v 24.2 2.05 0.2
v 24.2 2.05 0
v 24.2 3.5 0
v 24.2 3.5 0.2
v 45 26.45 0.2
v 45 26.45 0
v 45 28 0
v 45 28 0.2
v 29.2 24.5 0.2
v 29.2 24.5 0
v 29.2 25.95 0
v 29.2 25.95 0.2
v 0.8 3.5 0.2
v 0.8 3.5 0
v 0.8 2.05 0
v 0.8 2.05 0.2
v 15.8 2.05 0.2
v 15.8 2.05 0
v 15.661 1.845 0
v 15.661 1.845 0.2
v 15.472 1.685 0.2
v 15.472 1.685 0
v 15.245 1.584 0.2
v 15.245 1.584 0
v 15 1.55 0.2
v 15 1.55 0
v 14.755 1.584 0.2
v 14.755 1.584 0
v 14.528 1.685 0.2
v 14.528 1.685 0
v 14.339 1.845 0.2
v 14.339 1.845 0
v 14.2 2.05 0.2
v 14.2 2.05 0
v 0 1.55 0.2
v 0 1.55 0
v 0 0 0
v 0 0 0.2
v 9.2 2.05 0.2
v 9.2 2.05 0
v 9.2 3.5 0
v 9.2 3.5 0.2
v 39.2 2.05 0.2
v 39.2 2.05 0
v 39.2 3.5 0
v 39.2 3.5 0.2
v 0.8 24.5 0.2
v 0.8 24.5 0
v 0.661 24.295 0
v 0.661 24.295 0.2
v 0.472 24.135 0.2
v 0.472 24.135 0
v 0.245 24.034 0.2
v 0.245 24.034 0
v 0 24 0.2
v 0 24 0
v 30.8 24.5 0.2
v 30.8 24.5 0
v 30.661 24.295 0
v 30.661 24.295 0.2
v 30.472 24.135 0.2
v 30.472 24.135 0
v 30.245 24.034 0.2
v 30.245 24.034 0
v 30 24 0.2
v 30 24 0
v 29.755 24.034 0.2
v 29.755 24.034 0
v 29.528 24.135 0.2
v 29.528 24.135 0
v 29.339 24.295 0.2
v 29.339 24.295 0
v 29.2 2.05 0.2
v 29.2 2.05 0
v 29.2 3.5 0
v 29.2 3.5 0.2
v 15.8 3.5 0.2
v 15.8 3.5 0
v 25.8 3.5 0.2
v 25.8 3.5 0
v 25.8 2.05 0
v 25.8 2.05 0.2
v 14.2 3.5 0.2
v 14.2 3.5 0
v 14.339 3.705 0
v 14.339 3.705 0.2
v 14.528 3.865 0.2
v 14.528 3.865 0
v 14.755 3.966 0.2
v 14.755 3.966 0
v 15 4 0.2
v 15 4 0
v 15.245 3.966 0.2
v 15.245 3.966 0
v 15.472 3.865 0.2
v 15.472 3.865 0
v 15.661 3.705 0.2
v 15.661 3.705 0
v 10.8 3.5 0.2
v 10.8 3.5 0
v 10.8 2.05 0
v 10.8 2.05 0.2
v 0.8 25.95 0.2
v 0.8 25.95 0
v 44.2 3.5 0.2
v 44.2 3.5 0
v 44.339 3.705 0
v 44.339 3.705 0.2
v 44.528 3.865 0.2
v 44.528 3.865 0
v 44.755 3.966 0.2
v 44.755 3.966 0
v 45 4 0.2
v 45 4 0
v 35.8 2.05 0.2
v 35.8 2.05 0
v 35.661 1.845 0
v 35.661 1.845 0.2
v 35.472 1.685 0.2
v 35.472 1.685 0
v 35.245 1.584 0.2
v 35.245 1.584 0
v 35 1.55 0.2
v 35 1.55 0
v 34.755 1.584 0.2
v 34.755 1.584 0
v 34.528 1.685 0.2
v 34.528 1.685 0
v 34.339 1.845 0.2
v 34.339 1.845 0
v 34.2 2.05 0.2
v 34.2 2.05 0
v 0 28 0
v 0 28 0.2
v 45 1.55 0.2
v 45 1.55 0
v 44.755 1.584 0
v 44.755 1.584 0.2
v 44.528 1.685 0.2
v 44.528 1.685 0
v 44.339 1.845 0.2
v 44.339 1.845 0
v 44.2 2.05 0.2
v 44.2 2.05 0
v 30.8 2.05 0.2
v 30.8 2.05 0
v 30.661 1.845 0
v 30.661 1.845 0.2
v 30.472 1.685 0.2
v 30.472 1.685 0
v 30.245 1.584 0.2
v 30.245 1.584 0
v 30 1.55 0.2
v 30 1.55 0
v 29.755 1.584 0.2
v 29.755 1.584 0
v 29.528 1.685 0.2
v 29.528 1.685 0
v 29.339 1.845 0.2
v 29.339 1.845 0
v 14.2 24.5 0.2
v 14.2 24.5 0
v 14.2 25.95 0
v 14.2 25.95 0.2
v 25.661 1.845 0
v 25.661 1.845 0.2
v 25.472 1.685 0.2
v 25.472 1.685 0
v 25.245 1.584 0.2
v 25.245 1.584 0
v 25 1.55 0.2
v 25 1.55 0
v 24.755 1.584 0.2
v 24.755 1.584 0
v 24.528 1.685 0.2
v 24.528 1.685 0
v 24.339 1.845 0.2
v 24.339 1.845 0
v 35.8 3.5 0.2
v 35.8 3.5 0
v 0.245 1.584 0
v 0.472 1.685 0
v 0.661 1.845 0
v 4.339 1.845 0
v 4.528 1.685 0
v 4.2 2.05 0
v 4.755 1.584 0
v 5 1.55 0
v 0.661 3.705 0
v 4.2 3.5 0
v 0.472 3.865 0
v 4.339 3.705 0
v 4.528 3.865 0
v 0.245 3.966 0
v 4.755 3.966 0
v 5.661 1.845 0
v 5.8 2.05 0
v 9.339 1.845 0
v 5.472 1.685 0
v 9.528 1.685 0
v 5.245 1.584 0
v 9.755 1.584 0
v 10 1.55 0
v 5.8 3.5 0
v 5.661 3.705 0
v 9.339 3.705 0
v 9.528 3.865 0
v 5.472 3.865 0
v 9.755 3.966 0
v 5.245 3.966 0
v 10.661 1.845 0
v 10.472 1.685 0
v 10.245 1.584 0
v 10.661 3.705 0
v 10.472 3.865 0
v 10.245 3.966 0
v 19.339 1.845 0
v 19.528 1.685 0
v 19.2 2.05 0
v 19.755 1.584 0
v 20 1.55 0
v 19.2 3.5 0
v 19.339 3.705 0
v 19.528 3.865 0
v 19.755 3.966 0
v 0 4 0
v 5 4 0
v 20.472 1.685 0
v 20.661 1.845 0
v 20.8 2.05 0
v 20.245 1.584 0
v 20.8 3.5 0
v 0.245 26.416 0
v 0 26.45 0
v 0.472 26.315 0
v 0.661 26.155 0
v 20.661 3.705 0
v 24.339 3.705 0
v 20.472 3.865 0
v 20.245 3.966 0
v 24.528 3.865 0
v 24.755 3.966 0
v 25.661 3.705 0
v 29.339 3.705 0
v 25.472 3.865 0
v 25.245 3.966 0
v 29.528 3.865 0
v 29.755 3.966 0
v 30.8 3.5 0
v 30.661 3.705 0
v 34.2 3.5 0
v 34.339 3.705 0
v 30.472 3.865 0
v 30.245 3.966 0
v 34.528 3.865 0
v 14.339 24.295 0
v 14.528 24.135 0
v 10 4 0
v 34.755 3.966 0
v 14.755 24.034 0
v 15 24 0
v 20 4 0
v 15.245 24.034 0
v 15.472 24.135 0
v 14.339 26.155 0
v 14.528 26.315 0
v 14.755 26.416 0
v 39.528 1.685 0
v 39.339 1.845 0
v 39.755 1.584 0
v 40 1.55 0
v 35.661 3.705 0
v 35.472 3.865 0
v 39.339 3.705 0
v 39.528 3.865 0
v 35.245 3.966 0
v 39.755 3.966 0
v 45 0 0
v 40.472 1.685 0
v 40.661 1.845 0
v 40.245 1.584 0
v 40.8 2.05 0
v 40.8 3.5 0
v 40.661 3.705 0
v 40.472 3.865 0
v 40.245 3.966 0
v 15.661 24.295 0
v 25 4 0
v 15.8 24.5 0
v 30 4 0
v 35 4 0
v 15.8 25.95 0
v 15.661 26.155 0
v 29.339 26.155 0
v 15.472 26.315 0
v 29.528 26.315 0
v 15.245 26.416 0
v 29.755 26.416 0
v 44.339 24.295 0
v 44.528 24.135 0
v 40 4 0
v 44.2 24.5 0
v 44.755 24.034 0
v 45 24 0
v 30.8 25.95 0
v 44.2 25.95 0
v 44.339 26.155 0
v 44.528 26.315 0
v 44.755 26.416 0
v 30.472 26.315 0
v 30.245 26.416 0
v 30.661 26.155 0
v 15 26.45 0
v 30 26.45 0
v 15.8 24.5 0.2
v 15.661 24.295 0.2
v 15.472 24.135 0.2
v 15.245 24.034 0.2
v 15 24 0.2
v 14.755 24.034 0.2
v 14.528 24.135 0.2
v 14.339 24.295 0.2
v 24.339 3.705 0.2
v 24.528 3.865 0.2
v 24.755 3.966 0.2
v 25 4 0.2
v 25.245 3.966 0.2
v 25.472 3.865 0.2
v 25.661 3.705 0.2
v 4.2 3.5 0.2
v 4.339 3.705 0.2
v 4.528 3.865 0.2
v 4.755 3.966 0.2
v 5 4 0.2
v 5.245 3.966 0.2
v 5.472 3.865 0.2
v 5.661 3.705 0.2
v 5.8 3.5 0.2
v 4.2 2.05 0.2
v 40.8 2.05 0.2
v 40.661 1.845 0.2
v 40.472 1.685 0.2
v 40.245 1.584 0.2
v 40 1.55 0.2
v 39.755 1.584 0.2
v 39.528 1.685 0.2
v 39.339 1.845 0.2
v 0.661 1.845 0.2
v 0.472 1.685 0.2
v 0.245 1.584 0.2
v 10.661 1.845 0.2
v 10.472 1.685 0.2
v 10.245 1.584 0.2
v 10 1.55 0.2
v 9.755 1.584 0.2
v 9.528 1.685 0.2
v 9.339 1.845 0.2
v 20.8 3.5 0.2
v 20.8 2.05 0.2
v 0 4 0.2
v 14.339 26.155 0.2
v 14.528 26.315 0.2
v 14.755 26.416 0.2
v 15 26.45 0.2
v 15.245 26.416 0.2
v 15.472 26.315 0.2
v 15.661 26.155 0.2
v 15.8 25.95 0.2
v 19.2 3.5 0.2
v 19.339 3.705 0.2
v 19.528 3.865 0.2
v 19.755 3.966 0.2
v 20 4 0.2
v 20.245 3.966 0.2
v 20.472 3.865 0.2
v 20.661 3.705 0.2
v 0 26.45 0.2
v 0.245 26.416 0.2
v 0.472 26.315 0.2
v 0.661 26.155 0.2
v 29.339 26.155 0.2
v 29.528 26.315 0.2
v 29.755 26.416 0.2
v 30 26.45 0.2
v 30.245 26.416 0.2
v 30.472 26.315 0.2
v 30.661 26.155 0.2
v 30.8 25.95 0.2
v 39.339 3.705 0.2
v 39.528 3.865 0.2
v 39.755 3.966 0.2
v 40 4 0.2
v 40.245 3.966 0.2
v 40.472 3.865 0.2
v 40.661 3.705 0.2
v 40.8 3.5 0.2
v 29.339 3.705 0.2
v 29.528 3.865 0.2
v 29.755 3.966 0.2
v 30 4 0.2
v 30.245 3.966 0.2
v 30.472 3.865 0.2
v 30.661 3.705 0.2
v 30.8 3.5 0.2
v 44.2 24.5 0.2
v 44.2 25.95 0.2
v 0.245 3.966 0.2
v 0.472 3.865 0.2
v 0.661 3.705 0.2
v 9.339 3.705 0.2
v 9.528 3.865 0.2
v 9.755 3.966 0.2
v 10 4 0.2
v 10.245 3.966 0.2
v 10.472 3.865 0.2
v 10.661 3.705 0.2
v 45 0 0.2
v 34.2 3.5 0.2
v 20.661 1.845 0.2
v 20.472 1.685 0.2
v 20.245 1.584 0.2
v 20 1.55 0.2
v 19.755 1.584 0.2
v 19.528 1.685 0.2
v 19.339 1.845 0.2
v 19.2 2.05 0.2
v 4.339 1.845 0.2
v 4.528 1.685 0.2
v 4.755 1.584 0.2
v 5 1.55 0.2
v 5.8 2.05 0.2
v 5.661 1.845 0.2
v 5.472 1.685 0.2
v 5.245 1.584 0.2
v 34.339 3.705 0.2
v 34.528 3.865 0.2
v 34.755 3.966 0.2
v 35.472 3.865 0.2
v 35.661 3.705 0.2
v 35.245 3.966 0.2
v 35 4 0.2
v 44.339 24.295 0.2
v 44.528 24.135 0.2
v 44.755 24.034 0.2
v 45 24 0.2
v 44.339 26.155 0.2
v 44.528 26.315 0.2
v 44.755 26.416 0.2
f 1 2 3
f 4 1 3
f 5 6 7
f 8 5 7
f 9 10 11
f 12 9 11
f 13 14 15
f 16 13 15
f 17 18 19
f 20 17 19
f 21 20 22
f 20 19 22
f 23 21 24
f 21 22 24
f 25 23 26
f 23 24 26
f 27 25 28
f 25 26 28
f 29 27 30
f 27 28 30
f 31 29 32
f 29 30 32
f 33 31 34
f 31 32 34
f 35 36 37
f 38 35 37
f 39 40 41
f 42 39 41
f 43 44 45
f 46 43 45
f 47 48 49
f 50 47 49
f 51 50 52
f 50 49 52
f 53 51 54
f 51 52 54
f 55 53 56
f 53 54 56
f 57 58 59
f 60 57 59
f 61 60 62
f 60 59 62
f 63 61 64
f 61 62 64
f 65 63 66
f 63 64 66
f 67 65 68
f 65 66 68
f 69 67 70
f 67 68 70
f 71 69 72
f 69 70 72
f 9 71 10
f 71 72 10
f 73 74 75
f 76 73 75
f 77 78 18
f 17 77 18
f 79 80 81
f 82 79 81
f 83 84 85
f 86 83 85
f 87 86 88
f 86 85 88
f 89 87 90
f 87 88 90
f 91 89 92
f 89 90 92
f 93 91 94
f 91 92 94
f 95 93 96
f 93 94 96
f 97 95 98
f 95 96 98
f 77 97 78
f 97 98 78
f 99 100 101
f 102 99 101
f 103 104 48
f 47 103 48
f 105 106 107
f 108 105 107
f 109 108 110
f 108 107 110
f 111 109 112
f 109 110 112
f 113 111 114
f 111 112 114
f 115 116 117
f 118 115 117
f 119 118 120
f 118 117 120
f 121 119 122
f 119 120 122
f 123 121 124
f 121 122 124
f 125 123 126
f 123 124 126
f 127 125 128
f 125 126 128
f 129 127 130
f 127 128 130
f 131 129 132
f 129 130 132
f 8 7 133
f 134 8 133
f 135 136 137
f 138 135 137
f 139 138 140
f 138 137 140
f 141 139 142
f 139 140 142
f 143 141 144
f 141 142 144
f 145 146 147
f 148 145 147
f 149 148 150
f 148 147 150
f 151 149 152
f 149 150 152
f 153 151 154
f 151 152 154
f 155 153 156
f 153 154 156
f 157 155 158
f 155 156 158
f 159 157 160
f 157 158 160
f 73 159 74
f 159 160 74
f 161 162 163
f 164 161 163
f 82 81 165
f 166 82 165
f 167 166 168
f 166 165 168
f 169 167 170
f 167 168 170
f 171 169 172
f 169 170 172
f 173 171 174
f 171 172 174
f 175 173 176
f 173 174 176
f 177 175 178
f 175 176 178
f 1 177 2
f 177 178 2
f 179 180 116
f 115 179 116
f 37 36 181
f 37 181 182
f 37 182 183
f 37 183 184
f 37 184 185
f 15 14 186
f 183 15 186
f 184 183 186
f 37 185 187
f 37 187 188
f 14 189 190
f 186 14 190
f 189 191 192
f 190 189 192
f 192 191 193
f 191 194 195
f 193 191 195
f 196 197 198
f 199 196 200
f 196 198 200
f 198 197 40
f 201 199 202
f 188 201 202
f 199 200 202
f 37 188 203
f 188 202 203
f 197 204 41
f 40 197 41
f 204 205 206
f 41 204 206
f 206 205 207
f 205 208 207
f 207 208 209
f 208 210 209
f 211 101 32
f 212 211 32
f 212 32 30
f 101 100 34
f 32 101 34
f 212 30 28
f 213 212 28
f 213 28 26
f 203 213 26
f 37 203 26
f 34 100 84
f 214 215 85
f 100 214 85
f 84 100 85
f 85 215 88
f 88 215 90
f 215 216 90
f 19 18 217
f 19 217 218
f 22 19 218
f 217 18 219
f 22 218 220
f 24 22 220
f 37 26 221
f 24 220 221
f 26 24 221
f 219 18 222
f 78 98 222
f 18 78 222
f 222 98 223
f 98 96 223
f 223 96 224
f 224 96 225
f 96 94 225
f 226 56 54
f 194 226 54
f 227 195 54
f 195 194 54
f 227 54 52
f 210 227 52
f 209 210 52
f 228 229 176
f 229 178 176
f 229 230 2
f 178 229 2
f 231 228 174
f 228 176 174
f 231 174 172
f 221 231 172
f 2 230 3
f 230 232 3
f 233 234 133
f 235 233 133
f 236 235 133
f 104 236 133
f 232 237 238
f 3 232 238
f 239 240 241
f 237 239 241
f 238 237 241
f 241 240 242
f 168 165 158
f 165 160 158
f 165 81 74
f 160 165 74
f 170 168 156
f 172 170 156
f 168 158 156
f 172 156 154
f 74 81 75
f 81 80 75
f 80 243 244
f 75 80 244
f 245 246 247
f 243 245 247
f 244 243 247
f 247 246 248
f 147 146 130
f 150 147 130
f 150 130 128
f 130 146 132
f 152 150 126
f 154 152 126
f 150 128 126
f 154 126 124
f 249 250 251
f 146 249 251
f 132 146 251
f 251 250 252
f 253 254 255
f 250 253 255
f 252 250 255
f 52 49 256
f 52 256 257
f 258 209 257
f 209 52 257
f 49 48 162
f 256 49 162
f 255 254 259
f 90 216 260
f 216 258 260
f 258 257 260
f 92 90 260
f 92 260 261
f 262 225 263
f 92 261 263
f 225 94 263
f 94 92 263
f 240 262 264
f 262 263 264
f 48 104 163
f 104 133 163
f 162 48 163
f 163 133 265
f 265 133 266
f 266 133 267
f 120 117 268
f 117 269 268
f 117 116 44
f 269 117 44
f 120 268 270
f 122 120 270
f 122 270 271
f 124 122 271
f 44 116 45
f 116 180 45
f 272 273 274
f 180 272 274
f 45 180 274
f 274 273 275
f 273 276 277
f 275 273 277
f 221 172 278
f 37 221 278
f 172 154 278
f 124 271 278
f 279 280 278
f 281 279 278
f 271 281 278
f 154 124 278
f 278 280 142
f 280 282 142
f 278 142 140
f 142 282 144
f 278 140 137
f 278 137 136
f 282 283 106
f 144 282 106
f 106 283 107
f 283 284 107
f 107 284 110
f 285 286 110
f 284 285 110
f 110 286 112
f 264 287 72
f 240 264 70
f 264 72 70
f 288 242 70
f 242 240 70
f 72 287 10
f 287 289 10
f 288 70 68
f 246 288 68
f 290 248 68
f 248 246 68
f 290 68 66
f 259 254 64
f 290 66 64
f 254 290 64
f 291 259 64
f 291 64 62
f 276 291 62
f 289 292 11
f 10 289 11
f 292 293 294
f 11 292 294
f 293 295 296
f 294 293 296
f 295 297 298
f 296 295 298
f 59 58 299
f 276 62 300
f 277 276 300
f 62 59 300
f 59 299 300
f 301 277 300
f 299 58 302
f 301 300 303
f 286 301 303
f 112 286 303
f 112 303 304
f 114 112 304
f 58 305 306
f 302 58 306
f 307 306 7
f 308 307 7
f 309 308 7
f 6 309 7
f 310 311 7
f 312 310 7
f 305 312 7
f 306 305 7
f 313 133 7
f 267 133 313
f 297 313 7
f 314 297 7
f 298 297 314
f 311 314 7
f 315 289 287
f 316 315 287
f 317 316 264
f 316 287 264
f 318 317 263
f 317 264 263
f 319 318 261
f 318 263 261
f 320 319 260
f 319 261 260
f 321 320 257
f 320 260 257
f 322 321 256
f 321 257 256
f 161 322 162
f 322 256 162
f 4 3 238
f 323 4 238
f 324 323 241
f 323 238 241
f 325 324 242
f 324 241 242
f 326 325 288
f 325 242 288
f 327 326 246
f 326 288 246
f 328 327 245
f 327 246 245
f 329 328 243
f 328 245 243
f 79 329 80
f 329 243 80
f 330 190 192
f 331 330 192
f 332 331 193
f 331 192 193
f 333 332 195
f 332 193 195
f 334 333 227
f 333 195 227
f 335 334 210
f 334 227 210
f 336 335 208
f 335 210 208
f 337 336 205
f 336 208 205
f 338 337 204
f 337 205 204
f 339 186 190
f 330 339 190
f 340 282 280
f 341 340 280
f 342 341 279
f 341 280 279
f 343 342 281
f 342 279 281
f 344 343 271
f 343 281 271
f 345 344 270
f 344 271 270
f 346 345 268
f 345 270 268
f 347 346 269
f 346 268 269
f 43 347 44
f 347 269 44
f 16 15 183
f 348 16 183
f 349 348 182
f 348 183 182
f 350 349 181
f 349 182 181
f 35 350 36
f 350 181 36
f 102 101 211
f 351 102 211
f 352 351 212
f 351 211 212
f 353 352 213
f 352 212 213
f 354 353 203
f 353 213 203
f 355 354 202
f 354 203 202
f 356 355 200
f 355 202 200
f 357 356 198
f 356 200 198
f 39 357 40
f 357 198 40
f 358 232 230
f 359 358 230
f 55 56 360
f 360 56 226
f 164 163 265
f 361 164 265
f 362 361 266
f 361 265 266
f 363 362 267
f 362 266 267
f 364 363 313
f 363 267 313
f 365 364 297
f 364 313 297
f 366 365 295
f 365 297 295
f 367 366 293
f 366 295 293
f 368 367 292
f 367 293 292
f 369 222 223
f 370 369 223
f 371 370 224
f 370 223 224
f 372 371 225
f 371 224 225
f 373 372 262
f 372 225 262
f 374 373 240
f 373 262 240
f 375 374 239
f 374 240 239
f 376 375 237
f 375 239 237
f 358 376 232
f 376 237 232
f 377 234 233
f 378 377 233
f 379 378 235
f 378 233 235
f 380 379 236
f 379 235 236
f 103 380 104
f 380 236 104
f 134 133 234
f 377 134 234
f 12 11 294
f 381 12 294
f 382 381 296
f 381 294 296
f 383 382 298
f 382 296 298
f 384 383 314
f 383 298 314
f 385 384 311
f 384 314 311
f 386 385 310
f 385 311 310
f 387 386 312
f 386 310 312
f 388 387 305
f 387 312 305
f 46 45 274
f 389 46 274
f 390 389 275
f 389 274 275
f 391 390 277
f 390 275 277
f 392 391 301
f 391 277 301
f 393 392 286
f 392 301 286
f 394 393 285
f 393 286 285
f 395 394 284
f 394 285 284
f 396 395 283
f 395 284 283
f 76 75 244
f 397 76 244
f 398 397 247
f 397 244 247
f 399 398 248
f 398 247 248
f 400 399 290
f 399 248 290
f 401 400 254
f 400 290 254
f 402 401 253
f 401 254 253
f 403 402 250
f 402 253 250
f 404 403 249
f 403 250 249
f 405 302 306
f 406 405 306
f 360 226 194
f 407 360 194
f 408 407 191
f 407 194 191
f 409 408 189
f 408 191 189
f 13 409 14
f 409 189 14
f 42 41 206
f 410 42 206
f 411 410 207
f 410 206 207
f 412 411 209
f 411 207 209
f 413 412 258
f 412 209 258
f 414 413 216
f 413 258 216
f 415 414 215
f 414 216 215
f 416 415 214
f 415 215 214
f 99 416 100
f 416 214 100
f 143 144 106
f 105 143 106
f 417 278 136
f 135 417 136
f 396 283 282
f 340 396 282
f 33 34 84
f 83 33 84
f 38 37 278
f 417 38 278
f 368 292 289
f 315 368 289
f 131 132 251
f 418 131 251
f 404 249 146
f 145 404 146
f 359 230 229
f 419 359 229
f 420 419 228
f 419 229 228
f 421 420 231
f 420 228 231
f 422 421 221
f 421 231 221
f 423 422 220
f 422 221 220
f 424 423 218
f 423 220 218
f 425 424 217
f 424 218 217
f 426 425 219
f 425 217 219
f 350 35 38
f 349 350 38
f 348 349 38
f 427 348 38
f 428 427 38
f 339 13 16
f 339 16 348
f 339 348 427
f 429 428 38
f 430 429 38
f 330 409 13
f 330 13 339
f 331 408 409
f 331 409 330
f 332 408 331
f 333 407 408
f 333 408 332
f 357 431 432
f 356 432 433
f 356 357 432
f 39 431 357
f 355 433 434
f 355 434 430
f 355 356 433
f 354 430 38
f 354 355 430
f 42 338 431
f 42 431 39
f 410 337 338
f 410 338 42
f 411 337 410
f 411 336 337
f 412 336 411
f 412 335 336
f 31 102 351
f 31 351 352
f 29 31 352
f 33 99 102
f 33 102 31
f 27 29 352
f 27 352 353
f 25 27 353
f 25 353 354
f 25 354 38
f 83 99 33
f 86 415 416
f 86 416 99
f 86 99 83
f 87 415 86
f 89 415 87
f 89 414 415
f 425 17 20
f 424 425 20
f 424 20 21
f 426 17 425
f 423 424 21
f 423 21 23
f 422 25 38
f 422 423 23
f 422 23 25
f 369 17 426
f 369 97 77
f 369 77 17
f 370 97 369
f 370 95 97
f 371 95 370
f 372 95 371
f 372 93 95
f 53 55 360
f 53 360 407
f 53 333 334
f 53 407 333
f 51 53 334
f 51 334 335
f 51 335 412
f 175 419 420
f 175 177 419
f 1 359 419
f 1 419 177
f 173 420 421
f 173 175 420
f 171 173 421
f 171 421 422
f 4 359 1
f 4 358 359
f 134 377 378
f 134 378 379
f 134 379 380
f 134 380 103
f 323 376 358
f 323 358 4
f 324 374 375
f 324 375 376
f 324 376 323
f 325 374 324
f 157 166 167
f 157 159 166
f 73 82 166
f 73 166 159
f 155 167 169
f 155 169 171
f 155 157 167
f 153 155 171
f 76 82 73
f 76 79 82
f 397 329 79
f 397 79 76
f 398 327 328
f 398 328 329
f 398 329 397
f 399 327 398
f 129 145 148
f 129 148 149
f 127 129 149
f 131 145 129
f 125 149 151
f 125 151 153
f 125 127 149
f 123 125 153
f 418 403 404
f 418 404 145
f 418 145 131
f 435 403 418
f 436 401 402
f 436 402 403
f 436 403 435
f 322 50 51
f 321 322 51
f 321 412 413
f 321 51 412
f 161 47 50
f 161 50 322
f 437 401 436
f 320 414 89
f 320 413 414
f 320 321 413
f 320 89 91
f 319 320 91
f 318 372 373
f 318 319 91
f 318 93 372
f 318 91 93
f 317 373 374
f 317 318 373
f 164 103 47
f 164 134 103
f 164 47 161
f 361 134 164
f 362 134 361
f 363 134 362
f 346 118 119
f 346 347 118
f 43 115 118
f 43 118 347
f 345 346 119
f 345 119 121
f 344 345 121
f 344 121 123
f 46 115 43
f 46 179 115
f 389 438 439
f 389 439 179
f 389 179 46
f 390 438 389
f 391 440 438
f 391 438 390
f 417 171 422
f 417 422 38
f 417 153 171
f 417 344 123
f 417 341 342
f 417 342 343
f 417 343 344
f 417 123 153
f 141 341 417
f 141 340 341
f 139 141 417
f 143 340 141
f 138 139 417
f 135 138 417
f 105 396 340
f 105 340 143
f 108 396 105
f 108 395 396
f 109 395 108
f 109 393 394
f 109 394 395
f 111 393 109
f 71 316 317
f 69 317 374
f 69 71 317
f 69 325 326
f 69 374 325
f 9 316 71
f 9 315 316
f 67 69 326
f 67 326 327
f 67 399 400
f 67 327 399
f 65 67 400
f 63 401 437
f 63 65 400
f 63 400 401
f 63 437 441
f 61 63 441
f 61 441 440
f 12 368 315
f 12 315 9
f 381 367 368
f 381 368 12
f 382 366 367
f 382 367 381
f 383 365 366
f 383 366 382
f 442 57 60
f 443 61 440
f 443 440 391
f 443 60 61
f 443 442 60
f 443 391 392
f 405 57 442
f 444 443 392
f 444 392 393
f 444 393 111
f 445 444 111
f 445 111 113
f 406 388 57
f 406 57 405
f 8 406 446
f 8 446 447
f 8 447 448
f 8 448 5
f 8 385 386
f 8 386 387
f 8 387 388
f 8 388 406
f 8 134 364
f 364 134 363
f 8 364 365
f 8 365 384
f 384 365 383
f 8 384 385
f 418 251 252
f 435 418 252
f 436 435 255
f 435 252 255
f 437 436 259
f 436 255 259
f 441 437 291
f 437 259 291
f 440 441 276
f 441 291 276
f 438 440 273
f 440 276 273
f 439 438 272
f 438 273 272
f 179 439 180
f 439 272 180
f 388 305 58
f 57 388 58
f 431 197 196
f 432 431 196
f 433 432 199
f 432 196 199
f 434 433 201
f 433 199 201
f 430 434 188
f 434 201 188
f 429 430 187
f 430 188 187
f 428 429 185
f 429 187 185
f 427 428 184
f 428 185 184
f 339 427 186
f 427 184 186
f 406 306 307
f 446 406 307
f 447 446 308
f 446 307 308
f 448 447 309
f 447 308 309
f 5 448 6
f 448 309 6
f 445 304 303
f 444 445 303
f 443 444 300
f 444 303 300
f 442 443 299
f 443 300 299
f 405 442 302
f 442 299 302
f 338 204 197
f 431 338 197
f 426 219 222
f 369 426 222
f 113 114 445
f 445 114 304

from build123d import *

# Parameters (mm, degrees)
BOSS_EXTRUDE1_DEPTH = 0.2


with BuildPart() as part:
    # Sketch1 → Boss-Extrude1 (new body)
    with BuildSketch(Plane.XY):
        with BuildLine():
            Line((45, 4), (45, 24))
            ThreePointArc((45, 24), (44.528300943, 24.135281509), (44.2, 24.5))
            Line((44.2, 24.5), (44.2, 25.95))
            ThreePointArc((44.2, 25.95), (44.528298555, 26.31472475), (45, 26.450009012))
            Line((45, 26.450009012), (45, 28))
            Line((45, 28), (0, 28))
            Line((0, 28), (0, 26.450009012))
            ThreePointArc((0, 26.450009012), (0.471701445, 26.31472475), (0.8, 25.95))
            Line((0.8, 25.95), (0.8, 24.5))
            ThreePointArc((0.8, 24.5), (0.471699057, 24.135281509), (0, 24))
            Line((0, 24), (0, 4))
            ThreePointArc((0, 4), (0.471699057, 3.864718491), (0.8, 3.5))
            Line((0.8, 3.5), (0.8, 2.05))
            ThreePointArc((0.8, 2.05), (0.471701445, 1.68527525), (0, 1.549990988))
            Line((0, 1.549990988), (0, 0))
            Line((0, 0), (45, 0))
            Line((45, 0), (45, 1.549990988))
            ThreePointArc((45, 1.549990988), (44.528298555, 1.68527525), (44.2, 2.05))
            Line((44.2, 2.05), (44.2, 3.5))
            ThreePointArc((44.2, 3.5), (44.528300943, 3.864718491), (45, 4))
        make_face()
        with BuildLine():
            ThreePointArc((30.8, 24.5), (30, 24), (29.2, 24.5))
            Line((29.2, 24.5), (29.2, 25.95))
            ThreePointArc((29.2, 25.95), (30, 26.450009012), (30.8, 25.95))
            Line((30.8, 25.95), (30.8, 24.5))
        make_face(mode=Mode.SUBTRACT)
        with BuildLine():
            Line((14.2, 24.5), (14.2, 25.95))
            ThreePointArc((14.2, 25.95), (15, 26.450009012), (15.8, 25.95))
            Line((15.8, 25.95), (15.8, 24.5))
            ThreePointArc((15.8, 24.5), (15, 24), (14.2, 24.5))
        make_face(mode=Mode.SUBTRACT)
        with BuildLine():
            Line((34.2, 2.05), (34.2, 3.5))
            ThreePointArc((34.2, 3.5), (35, 4), (35.8, 3.5))
            Line((35.8, 3.5), (35.8, 2.05))
            ThreePointArc((35.8, 2.05), (35, 1.549990988), (34.2, 2.05))
        make_face(mode=Mode.SUBTRACT)
        with BuildLine():
            Line((30.8, 3.5), (30.8, 2.05))
            ThreePointArc((30.8, 2.05), (30, 1.549990988), (29.2, 2.05))
            Line((29.2, 2.05), (29.2, 3.5))
            ThreePointArc((29.2, 3.5), (30, 4), (30.8, 3.5))
        make_face(mode=Mode.SUBTRACT)
        with BuildLine():
            ThreePointArc((4.2, 3.5), (5, 4), (5.8, 3.5))
            Line((5.8, 3.5), (5.8, 2.05))
            ThreePointArc((5.8, 2.05), (5, 1.549990988), (4.2, 2.05))
            Line((4.2, 2.05), (4.2, 3.5))
        make_face(mode=Mode.SUBTRACT)
        with BuildLine():
            ThreePointArc((9.2, 3.5), (10, 4), (10.8, 3.5))
            Line((10.8, 3.5), (10.8, 2.05))
            ThreePointArc((10.8, 2.05), (10, 1.549990988), (9.2, 2.05))
            Line((9.2, 2.05), (9.2, 3.5))
        make_face(mode=Mode.SUBTRACT)
        with BuildLine():
            ThreePointArc((14.2, 3.5), (15, 4), (15.8, 3.5))
            Line((15.8, 3.5), (15.8, 2.05))
            ThreePointArc((15.8, 2.05), (15, 1.549990988), (14.2, 2.05))
            Line((14.2, 2.05), (14.2, 3.5))
        make_face(mode=Mode.SUBTRACT)
        with BuildLine():
            ThreePointArc((19.2, 3.5), (20, 4), (20.8, 3.5))
            Line((20.8, 3.5), (20.8, 2.05))
            ThreePointArc((20.8, 2.05), (20, 1.549990988), (19.2, 2.05))
            Line((19.2, 2.05), (19.2, 3.5))
        make_face(mode=Mode.SUBTRACT)
        with BuildLine():
            ThreePointArc((24.2, 3.5), (25, 4), (25.8, 3.5))
            Line((25.8, 3.5), (25.8, 2.05))
            ThreePointArc((25.8, 2.05), (25, 1.549990988), (24.2, 2.05))
            Line((24.2, 2.05), (24.2, 3.5))
        make_face(mode=Mode.SUBTRACT)
        with BuildLine():
            ThreePointArc((39.2, 3.5), (40, 4), (40.8, 3.5))
            Line((40.8, 3.5), (40.8, 2.05))
            ThreePointArc((40.8, 2.05), (40, 1.549990988), (39.2, 2.05))
            Line((39.2, 2.05), (39.2, 3.5))
        make_face(mode=Mode.SUBTRACT)
    extrude(amount=BOSS_EXTRUDE1_DEPTH)


solid = part.part
